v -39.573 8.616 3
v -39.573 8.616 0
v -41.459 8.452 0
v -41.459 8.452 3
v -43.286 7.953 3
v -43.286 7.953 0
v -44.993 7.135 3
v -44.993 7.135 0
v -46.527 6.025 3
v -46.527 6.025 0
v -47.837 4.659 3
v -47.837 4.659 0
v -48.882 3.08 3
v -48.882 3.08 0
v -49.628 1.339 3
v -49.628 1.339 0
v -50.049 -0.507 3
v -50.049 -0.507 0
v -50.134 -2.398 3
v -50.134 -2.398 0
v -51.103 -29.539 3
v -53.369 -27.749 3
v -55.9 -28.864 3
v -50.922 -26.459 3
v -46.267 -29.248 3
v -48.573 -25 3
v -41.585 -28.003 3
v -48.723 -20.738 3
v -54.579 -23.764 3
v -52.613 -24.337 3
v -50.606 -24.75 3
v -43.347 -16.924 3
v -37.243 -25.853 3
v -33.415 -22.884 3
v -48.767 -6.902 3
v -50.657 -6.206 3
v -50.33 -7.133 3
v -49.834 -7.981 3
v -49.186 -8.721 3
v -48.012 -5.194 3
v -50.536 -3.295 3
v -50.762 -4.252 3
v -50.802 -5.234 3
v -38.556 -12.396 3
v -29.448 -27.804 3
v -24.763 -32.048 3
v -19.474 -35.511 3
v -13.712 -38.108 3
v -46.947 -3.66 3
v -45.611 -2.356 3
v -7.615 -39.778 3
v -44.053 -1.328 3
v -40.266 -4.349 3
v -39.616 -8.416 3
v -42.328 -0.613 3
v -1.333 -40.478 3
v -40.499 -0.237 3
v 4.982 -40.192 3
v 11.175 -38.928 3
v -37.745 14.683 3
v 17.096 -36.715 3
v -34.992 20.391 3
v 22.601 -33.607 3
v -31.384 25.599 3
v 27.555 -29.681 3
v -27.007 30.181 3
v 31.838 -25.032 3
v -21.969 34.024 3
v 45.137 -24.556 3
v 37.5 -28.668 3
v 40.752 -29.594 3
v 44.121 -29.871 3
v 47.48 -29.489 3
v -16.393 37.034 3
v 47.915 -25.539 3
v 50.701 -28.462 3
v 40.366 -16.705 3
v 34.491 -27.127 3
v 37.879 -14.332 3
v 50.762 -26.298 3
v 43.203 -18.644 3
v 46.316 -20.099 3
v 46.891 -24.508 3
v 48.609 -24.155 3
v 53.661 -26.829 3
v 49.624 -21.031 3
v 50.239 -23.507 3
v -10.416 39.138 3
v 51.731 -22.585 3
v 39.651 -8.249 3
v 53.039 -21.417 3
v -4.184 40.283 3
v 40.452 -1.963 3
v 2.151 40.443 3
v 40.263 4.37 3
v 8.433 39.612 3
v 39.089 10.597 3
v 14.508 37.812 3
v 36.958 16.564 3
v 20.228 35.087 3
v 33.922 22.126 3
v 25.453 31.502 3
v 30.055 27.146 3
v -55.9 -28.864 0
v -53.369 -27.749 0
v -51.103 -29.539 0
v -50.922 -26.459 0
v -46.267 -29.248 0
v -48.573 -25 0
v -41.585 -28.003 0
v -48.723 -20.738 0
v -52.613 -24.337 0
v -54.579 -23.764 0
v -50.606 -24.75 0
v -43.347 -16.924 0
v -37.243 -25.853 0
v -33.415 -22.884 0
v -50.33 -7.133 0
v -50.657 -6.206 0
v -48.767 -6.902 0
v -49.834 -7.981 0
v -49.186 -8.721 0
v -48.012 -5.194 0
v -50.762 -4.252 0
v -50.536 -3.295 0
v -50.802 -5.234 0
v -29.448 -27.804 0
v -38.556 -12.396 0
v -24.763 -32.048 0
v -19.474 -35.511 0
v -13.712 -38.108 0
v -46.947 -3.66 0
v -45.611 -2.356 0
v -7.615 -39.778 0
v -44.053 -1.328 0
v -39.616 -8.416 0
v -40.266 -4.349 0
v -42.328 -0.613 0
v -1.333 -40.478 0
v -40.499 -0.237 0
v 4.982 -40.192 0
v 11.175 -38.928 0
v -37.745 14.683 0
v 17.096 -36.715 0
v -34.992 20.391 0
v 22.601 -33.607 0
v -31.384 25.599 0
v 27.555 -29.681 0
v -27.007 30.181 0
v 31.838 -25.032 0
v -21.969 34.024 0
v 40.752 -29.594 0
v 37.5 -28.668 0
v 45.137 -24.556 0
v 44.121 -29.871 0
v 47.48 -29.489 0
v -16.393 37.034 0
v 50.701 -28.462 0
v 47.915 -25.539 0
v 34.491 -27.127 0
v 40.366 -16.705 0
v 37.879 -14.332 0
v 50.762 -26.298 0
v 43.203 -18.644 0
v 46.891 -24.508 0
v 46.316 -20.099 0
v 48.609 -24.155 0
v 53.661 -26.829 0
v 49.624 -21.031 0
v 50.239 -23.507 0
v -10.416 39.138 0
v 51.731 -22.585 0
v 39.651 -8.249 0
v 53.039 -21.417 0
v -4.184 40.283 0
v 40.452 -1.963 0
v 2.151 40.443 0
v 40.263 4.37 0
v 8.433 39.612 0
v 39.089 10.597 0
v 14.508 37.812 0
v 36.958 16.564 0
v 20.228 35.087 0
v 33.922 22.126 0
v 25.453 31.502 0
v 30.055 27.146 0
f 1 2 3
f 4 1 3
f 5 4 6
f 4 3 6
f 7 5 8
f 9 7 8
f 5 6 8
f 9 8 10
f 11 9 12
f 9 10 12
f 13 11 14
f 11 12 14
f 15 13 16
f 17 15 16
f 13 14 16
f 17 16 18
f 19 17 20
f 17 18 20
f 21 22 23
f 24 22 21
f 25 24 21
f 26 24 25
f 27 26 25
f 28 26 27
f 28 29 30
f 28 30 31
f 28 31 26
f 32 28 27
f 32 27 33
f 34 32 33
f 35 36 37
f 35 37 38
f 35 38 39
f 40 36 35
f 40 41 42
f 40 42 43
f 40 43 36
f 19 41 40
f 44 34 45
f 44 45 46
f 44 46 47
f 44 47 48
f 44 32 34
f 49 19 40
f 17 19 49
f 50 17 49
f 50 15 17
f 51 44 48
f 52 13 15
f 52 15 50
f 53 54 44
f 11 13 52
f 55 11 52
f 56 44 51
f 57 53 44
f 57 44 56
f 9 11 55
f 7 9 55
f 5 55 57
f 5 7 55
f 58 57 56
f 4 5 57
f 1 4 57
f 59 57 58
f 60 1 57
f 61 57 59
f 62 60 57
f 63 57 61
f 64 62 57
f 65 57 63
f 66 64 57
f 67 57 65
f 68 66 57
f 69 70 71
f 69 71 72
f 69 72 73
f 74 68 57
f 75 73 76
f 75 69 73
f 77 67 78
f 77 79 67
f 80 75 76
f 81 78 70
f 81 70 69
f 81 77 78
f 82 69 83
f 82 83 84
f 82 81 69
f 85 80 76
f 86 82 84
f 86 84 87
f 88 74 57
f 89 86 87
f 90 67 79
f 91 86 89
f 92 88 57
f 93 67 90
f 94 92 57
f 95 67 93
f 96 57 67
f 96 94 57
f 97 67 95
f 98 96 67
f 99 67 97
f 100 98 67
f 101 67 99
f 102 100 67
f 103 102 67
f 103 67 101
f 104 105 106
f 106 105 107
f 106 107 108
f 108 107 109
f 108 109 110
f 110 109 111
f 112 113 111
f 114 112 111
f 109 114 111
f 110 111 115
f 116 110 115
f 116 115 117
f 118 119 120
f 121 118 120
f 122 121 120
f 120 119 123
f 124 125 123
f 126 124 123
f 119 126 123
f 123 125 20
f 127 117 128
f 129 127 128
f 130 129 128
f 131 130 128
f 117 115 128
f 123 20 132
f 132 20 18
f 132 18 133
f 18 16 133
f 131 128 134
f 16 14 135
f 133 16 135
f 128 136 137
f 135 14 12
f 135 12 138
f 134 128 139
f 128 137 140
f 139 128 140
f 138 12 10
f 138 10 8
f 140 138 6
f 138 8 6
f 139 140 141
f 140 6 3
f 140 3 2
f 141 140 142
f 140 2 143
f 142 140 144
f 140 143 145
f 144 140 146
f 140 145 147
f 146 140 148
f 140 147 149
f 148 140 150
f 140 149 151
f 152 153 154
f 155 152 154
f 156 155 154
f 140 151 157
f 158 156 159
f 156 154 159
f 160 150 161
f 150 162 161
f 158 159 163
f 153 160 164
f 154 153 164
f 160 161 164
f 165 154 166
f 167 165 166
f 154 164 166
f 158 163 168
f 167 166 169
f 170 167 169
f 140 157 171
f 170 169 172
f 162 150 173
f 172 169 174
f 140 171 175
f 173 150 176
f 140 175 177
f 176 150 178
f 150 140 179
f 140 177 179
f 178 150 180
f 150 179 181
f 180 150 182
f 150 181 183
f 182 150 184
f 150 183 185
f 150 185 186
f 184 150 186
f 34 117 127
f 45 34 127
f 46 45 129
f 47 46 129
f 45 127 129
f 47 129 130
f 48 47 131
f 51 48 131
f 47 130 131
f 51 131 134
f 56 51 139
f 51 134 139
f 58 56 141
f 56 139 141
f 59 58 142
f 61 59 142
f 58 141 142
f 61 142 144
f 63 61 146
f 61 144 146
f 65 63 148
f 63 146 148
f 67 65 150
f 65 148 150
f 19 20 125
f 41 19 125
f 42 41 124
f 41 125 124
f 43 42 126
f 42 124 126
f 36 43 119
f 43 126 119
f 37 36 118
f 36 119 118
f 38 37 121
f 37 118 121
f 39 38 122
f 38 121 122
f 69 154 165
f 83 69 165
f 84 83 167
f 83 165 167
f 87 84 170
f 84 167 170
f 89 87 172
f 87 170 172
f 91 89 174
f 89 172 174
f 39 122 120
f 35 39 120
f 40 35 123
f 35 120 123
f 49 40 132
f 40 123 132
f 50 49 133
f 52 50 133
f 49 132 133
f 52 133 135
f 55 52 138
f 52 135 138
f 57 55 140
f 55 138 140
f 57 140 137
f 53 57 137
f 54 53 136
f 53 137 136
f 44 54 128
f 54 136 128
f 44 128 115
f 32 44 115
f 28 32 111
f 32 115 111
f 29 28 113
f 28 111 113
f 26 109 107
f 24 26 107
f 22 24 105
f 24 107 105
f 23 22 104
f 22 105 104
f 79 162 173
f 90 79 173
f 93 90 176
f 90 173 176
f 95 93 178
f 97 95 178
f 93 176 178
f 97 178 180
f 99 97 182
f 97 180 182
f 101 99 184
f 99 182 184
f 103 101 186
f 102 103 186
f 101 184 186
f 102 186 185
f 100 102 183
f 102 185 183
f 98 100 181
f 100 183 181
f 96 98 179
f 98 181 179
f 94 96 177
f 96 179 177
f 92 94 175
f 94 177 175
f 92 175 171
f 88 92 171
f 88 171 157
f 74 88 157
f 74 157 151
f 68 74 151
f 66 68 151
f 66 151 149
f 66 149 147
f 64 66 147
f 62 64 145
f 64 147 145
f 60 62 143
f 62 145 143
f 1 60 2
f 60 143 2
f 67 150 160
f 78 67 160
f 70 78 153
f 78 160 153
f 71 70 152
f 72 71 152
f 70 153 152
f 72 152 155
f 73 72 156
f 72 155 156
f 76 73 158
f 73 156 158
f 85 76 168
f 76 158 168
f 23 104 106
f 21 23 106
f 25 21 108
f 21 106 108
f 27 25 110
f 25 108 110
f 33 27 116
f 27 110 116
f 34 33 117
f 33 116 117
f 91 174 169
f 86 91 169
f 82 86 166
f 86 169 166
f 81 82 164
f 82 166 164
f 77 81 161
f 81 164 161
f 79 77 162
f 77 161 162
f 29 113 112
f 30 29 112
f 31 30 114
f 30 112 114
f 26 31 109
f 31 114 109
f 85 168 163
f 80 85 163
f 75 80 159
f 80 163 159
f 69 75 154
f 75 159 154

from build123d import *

# Parameters (mm, degrees)
BOSS_EXTRUDE1_DEPTH = 3


with BuildPart() as part:
    # Sketch1 → Boss-Extrude1 (new body)
    with BuildSketch(Plane.XY):
        with BuildLine():
            ThreePointArc((-33.415395542, -22.883647891), (-1.332760204, -40.478065051), (31.837744667, -25.032139631))
            ThreePointArc((31.837744667, -25.032139631), (42.429569674, -29.815081636), (53.66099822, -26.828728675))
            ThreePointArc((53.66099822, -26.828728675), (49.331198922, -25.947152532), (45.137351659, -24.555756259))
            ThreePointArc((45.137351659, -24.555756259), (49.437791518, -23.866847227), (53.038636725, -21.416889589))
            ThreePointArc((53.038636725, -21.416889589), (44.73000771, -19.434385597), (37.879146269, -14.332490292))
            ThreePointArc((37.879146269, -14.332490292), (11.505540341, 38.831334531), (-39.572863934, 8.616173169))
            ThreePointArc((-39.572863934, 8.616173169), (-47.212914381, 5.371433585), (-50.134307409, -2.398004527))
            ThreePointArc((-50.134307409, -2.398004527), (-50.75248884, -5.72327668), (-49.186370781, -8.721085446))
            ThreePointArc((-49.186370781, -8.721085446), (-46.310274165, -2.976393999), (-40.499308481, -0.236669673))
            ThreePointArc((-40.499308481, -0.236669673), (-39.99258879, -6.390840467), (-38.556168915, -12.396444595))
            ThreePointArc((-38.556168915, -12.396444595), (-45.968324298, -18.925044219), (-54.579160775, -23.764068463))
            ThreePointArc((-54.579160775, -23.764068463), (-51.613504277, -24.564074489), (-48.572929157, -25))
            ThreePointArc((-48.572929157, -25), (-52.134064431, -27.12602852), (-55.899902615, -28.863884809))
            ThreePointArc((-55.899902615, -28.863884809), (-43.894548209, -28.742874568), (-33.415395542, -22.883647891))
        make_face()
    extrude(amount=BOSS_EXTRUDE1_DEPTH)


solid = part.part
